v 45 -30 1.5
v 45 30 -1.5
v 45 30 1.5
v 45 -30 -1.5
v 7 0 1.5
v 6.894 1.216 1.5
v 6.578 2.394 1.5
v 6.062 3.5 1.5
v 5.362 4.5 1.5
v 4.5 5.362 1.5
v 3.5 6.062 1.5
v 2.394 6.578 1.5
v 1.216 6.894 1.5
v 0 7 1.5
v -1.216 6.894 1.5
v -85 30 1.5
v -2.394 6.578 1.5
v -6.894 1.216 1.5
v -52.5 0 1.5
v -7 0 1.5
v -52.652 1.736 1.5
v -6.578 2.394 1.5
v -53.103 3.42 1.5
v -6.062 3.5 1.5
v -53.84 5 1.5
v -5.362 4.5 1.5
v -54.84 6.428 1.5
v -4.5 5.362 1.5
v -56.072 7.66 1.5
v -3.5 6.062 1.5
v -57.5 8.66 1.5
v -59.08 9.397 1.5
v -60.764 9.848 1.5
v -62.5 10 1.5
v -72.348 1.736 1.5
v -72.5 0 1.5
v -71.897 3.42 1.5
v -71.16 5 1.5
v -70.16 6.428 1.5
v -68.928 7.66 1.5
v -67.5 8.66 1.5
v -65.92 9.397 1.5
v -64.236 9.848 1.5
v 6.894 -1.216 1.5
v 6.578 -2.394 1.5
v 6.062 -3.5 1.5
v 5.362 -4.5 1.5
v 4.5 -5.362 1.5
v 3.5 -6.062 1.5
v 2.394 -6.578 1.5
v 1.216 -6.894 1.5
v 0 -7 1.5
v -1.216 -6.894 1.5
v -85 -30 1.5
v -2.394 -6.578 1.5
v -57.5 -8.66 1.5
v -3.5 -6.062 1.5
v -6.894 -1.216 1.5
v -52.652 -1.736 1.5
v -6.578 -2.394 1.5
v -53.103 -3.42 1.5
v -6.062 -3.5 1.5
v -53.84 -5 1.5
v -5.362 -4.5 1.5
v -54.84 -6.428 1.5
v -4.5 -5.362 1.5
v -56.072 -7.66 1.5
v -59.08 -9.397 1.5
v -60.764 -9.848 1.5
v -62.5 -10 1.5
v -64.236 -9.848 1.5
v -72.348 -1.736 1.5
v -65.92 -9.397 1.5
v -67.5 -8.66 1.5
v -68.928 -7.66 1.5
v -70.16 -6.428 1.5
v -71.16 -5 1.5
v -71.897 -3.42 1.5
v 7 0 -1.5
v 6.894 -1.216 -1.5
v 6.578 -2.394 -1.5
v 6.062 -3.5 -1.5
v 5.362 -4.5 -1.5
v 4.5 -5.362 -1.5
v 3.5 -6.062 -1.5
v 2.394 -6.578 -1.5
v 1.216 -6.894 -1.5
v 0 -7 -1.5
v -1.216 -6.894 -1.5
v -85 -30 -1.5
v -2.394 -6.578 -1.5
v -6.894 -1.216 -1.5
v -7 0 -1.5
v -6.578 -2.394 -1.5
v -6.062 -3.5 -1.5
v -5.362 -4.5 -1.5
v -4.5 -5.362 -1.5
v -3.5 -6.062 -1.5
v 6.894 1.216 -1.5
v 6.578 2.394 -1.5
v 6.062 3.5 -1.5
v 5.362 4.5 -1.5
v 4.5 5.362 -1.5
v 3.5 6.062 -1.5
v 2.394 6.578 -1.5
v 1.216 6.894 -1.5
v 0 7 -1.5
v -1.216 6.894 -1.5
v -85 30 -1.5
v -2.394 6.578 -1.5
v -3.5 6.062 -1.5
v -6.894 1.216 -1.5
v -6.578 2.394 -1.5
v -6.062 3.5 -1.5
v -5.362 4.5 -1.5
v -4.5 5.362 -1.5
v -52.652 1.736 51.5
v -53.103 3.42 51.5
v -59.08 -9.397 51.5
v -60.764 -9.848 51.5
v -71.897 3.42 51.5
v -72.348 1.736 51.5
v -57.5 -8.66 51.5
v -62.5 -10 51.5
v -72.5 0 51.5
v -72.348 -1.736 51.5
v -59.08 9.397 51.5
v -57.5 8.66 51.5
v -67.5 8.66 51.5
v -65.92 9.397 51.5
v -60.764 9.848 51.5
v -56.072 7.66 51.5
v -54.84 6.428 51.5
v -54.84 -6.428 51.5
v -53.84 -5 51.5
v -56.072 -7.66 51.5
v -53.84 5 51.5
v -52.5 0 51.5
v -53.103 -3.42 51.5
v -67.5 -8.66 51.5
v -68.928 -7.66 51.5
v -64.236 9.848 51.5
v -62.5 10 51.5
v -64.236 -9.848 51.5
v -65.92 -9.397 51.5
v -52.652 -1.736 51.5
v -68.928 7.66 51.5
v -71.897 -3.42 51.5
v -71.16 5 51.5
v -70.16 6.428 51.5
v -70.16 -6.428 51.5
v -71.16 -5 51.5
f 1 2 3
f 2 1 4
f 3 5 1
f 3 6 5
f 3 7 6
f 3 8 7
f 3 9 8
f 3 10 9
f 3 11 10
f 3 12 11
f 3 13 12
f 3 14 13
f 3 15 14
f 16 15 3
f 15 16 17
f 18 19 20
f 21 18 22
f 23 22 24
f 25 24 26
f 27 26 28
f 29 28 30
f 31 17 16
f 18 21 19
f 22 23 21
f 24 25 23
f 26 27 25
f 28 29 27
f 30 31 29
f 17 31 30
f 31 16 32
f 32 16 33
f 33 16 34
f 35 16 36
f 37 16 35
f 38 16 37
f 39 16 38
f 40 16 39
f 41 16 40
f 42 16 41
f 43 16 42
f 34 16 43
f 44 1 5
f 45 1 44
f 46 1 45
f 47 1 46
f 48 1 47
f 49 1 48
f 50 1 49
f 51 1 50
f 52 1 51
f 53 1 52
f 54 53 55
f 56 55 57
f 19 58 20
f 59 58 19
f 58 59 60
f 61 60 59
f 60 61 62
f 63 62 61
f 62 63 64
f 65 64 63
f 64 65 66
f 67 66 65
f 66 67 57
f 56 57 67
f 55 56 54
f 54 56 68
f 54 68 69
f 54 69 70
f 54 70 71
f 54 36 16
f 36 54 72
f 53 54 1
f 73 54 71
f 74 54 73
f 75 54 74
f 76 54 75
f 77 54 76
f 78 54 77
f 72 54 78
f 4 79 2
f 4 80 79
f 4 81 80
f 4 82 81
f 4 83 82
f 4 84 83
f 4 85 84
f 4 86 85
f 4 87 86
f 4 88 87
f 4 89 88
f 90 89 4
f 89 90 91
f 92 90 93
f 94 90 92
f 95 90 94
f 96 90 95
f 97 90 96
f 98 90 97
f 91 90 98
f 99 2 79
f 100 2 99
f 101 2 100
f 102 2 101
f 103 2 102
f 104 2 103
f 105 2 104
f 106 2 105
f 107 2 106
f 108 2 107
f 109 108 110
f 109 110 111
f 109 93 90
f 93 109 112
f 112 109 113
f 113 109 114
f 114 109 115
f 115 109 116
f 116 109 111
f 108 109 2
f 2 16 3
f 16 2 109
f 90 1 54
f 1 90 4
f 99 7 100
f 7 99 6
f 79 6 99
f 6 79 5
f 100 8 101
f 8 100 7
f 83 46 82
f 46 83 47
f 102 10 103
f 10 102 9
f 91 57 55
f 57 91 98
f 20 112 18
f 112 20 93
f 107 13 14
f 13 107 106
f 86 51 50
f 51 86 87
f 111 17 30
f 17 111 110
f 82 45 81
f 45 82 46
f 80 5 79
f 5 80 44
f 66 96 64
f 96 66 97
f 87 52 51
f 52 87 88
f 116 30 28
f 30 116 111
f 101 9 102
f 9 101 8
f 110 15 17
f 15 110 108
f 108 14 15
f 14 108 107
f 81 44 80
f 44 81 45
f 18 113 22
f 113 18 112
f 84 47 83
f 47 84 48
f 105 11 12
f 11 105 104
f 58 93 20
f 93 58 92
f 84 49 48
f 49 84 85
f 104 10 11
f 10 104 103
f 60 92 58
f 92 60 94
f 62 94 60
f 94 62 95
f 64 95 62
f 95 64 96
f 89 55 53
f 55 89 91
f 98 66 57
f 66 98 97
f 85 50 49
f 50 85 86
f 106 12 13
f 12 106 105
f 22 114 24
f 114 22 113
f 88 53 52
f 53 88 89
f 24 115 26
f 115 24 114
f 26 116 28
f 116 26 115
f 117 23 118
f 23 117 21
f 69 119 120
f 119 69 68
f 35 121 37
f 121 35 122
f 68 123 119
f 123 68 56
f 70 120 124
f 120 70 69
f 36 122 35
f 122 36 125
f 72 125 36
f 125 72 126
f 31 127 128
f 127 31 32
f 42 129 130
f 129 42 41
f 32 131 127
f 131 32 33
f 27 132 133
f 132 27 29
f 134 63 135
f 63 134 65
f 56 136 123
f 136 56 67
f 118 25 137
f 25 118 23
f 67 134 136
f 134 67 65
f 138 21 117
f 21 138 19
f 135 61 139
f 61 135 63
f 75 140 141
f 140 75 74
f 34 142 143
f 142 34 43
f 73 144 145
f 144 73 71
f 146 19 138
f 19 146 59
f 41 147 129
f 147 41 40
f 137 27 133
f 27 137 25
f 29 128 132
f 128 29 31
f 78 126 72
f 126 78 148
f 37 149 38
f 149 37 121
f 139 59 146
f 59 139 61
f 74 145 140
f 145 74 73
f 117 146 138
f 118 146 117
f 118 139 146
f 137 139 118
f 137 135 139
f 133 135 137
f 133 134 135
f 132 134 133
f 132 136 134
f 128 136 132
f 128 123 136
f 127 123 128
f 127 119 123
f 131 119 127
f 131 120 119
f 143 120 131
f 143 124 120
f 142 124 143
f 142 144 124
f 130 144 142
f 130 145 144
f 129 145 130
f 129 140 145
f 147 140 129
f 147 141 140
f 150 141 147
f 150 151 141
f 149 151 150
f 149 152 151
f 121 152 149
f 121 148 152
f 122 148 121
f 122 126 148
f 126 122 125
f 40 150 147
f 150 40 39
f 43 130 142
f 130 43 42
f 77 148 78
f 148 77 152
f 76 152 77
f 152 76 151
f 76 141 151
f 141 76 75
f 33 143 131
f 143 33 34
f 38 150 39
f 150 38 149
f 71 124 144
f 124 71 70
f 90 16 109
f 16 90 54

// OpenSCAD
$fn=36;
$outer=9;
$inner=6;
$height_base=3;
$height_coupling=10;

union(){
   translate([0,0,0])
	difference(){
		cube([90,60,$height_base],center=true);
	    cylinder(d=14,h=1e3,center=true);	
	   }

	translate([-45.0/2-40,0,$height_base/2+50/2])
	cylinder(d=20,50,center=true);

   translate([-65,0,0])
	cube([40,60,$height_base],center=true);


}
